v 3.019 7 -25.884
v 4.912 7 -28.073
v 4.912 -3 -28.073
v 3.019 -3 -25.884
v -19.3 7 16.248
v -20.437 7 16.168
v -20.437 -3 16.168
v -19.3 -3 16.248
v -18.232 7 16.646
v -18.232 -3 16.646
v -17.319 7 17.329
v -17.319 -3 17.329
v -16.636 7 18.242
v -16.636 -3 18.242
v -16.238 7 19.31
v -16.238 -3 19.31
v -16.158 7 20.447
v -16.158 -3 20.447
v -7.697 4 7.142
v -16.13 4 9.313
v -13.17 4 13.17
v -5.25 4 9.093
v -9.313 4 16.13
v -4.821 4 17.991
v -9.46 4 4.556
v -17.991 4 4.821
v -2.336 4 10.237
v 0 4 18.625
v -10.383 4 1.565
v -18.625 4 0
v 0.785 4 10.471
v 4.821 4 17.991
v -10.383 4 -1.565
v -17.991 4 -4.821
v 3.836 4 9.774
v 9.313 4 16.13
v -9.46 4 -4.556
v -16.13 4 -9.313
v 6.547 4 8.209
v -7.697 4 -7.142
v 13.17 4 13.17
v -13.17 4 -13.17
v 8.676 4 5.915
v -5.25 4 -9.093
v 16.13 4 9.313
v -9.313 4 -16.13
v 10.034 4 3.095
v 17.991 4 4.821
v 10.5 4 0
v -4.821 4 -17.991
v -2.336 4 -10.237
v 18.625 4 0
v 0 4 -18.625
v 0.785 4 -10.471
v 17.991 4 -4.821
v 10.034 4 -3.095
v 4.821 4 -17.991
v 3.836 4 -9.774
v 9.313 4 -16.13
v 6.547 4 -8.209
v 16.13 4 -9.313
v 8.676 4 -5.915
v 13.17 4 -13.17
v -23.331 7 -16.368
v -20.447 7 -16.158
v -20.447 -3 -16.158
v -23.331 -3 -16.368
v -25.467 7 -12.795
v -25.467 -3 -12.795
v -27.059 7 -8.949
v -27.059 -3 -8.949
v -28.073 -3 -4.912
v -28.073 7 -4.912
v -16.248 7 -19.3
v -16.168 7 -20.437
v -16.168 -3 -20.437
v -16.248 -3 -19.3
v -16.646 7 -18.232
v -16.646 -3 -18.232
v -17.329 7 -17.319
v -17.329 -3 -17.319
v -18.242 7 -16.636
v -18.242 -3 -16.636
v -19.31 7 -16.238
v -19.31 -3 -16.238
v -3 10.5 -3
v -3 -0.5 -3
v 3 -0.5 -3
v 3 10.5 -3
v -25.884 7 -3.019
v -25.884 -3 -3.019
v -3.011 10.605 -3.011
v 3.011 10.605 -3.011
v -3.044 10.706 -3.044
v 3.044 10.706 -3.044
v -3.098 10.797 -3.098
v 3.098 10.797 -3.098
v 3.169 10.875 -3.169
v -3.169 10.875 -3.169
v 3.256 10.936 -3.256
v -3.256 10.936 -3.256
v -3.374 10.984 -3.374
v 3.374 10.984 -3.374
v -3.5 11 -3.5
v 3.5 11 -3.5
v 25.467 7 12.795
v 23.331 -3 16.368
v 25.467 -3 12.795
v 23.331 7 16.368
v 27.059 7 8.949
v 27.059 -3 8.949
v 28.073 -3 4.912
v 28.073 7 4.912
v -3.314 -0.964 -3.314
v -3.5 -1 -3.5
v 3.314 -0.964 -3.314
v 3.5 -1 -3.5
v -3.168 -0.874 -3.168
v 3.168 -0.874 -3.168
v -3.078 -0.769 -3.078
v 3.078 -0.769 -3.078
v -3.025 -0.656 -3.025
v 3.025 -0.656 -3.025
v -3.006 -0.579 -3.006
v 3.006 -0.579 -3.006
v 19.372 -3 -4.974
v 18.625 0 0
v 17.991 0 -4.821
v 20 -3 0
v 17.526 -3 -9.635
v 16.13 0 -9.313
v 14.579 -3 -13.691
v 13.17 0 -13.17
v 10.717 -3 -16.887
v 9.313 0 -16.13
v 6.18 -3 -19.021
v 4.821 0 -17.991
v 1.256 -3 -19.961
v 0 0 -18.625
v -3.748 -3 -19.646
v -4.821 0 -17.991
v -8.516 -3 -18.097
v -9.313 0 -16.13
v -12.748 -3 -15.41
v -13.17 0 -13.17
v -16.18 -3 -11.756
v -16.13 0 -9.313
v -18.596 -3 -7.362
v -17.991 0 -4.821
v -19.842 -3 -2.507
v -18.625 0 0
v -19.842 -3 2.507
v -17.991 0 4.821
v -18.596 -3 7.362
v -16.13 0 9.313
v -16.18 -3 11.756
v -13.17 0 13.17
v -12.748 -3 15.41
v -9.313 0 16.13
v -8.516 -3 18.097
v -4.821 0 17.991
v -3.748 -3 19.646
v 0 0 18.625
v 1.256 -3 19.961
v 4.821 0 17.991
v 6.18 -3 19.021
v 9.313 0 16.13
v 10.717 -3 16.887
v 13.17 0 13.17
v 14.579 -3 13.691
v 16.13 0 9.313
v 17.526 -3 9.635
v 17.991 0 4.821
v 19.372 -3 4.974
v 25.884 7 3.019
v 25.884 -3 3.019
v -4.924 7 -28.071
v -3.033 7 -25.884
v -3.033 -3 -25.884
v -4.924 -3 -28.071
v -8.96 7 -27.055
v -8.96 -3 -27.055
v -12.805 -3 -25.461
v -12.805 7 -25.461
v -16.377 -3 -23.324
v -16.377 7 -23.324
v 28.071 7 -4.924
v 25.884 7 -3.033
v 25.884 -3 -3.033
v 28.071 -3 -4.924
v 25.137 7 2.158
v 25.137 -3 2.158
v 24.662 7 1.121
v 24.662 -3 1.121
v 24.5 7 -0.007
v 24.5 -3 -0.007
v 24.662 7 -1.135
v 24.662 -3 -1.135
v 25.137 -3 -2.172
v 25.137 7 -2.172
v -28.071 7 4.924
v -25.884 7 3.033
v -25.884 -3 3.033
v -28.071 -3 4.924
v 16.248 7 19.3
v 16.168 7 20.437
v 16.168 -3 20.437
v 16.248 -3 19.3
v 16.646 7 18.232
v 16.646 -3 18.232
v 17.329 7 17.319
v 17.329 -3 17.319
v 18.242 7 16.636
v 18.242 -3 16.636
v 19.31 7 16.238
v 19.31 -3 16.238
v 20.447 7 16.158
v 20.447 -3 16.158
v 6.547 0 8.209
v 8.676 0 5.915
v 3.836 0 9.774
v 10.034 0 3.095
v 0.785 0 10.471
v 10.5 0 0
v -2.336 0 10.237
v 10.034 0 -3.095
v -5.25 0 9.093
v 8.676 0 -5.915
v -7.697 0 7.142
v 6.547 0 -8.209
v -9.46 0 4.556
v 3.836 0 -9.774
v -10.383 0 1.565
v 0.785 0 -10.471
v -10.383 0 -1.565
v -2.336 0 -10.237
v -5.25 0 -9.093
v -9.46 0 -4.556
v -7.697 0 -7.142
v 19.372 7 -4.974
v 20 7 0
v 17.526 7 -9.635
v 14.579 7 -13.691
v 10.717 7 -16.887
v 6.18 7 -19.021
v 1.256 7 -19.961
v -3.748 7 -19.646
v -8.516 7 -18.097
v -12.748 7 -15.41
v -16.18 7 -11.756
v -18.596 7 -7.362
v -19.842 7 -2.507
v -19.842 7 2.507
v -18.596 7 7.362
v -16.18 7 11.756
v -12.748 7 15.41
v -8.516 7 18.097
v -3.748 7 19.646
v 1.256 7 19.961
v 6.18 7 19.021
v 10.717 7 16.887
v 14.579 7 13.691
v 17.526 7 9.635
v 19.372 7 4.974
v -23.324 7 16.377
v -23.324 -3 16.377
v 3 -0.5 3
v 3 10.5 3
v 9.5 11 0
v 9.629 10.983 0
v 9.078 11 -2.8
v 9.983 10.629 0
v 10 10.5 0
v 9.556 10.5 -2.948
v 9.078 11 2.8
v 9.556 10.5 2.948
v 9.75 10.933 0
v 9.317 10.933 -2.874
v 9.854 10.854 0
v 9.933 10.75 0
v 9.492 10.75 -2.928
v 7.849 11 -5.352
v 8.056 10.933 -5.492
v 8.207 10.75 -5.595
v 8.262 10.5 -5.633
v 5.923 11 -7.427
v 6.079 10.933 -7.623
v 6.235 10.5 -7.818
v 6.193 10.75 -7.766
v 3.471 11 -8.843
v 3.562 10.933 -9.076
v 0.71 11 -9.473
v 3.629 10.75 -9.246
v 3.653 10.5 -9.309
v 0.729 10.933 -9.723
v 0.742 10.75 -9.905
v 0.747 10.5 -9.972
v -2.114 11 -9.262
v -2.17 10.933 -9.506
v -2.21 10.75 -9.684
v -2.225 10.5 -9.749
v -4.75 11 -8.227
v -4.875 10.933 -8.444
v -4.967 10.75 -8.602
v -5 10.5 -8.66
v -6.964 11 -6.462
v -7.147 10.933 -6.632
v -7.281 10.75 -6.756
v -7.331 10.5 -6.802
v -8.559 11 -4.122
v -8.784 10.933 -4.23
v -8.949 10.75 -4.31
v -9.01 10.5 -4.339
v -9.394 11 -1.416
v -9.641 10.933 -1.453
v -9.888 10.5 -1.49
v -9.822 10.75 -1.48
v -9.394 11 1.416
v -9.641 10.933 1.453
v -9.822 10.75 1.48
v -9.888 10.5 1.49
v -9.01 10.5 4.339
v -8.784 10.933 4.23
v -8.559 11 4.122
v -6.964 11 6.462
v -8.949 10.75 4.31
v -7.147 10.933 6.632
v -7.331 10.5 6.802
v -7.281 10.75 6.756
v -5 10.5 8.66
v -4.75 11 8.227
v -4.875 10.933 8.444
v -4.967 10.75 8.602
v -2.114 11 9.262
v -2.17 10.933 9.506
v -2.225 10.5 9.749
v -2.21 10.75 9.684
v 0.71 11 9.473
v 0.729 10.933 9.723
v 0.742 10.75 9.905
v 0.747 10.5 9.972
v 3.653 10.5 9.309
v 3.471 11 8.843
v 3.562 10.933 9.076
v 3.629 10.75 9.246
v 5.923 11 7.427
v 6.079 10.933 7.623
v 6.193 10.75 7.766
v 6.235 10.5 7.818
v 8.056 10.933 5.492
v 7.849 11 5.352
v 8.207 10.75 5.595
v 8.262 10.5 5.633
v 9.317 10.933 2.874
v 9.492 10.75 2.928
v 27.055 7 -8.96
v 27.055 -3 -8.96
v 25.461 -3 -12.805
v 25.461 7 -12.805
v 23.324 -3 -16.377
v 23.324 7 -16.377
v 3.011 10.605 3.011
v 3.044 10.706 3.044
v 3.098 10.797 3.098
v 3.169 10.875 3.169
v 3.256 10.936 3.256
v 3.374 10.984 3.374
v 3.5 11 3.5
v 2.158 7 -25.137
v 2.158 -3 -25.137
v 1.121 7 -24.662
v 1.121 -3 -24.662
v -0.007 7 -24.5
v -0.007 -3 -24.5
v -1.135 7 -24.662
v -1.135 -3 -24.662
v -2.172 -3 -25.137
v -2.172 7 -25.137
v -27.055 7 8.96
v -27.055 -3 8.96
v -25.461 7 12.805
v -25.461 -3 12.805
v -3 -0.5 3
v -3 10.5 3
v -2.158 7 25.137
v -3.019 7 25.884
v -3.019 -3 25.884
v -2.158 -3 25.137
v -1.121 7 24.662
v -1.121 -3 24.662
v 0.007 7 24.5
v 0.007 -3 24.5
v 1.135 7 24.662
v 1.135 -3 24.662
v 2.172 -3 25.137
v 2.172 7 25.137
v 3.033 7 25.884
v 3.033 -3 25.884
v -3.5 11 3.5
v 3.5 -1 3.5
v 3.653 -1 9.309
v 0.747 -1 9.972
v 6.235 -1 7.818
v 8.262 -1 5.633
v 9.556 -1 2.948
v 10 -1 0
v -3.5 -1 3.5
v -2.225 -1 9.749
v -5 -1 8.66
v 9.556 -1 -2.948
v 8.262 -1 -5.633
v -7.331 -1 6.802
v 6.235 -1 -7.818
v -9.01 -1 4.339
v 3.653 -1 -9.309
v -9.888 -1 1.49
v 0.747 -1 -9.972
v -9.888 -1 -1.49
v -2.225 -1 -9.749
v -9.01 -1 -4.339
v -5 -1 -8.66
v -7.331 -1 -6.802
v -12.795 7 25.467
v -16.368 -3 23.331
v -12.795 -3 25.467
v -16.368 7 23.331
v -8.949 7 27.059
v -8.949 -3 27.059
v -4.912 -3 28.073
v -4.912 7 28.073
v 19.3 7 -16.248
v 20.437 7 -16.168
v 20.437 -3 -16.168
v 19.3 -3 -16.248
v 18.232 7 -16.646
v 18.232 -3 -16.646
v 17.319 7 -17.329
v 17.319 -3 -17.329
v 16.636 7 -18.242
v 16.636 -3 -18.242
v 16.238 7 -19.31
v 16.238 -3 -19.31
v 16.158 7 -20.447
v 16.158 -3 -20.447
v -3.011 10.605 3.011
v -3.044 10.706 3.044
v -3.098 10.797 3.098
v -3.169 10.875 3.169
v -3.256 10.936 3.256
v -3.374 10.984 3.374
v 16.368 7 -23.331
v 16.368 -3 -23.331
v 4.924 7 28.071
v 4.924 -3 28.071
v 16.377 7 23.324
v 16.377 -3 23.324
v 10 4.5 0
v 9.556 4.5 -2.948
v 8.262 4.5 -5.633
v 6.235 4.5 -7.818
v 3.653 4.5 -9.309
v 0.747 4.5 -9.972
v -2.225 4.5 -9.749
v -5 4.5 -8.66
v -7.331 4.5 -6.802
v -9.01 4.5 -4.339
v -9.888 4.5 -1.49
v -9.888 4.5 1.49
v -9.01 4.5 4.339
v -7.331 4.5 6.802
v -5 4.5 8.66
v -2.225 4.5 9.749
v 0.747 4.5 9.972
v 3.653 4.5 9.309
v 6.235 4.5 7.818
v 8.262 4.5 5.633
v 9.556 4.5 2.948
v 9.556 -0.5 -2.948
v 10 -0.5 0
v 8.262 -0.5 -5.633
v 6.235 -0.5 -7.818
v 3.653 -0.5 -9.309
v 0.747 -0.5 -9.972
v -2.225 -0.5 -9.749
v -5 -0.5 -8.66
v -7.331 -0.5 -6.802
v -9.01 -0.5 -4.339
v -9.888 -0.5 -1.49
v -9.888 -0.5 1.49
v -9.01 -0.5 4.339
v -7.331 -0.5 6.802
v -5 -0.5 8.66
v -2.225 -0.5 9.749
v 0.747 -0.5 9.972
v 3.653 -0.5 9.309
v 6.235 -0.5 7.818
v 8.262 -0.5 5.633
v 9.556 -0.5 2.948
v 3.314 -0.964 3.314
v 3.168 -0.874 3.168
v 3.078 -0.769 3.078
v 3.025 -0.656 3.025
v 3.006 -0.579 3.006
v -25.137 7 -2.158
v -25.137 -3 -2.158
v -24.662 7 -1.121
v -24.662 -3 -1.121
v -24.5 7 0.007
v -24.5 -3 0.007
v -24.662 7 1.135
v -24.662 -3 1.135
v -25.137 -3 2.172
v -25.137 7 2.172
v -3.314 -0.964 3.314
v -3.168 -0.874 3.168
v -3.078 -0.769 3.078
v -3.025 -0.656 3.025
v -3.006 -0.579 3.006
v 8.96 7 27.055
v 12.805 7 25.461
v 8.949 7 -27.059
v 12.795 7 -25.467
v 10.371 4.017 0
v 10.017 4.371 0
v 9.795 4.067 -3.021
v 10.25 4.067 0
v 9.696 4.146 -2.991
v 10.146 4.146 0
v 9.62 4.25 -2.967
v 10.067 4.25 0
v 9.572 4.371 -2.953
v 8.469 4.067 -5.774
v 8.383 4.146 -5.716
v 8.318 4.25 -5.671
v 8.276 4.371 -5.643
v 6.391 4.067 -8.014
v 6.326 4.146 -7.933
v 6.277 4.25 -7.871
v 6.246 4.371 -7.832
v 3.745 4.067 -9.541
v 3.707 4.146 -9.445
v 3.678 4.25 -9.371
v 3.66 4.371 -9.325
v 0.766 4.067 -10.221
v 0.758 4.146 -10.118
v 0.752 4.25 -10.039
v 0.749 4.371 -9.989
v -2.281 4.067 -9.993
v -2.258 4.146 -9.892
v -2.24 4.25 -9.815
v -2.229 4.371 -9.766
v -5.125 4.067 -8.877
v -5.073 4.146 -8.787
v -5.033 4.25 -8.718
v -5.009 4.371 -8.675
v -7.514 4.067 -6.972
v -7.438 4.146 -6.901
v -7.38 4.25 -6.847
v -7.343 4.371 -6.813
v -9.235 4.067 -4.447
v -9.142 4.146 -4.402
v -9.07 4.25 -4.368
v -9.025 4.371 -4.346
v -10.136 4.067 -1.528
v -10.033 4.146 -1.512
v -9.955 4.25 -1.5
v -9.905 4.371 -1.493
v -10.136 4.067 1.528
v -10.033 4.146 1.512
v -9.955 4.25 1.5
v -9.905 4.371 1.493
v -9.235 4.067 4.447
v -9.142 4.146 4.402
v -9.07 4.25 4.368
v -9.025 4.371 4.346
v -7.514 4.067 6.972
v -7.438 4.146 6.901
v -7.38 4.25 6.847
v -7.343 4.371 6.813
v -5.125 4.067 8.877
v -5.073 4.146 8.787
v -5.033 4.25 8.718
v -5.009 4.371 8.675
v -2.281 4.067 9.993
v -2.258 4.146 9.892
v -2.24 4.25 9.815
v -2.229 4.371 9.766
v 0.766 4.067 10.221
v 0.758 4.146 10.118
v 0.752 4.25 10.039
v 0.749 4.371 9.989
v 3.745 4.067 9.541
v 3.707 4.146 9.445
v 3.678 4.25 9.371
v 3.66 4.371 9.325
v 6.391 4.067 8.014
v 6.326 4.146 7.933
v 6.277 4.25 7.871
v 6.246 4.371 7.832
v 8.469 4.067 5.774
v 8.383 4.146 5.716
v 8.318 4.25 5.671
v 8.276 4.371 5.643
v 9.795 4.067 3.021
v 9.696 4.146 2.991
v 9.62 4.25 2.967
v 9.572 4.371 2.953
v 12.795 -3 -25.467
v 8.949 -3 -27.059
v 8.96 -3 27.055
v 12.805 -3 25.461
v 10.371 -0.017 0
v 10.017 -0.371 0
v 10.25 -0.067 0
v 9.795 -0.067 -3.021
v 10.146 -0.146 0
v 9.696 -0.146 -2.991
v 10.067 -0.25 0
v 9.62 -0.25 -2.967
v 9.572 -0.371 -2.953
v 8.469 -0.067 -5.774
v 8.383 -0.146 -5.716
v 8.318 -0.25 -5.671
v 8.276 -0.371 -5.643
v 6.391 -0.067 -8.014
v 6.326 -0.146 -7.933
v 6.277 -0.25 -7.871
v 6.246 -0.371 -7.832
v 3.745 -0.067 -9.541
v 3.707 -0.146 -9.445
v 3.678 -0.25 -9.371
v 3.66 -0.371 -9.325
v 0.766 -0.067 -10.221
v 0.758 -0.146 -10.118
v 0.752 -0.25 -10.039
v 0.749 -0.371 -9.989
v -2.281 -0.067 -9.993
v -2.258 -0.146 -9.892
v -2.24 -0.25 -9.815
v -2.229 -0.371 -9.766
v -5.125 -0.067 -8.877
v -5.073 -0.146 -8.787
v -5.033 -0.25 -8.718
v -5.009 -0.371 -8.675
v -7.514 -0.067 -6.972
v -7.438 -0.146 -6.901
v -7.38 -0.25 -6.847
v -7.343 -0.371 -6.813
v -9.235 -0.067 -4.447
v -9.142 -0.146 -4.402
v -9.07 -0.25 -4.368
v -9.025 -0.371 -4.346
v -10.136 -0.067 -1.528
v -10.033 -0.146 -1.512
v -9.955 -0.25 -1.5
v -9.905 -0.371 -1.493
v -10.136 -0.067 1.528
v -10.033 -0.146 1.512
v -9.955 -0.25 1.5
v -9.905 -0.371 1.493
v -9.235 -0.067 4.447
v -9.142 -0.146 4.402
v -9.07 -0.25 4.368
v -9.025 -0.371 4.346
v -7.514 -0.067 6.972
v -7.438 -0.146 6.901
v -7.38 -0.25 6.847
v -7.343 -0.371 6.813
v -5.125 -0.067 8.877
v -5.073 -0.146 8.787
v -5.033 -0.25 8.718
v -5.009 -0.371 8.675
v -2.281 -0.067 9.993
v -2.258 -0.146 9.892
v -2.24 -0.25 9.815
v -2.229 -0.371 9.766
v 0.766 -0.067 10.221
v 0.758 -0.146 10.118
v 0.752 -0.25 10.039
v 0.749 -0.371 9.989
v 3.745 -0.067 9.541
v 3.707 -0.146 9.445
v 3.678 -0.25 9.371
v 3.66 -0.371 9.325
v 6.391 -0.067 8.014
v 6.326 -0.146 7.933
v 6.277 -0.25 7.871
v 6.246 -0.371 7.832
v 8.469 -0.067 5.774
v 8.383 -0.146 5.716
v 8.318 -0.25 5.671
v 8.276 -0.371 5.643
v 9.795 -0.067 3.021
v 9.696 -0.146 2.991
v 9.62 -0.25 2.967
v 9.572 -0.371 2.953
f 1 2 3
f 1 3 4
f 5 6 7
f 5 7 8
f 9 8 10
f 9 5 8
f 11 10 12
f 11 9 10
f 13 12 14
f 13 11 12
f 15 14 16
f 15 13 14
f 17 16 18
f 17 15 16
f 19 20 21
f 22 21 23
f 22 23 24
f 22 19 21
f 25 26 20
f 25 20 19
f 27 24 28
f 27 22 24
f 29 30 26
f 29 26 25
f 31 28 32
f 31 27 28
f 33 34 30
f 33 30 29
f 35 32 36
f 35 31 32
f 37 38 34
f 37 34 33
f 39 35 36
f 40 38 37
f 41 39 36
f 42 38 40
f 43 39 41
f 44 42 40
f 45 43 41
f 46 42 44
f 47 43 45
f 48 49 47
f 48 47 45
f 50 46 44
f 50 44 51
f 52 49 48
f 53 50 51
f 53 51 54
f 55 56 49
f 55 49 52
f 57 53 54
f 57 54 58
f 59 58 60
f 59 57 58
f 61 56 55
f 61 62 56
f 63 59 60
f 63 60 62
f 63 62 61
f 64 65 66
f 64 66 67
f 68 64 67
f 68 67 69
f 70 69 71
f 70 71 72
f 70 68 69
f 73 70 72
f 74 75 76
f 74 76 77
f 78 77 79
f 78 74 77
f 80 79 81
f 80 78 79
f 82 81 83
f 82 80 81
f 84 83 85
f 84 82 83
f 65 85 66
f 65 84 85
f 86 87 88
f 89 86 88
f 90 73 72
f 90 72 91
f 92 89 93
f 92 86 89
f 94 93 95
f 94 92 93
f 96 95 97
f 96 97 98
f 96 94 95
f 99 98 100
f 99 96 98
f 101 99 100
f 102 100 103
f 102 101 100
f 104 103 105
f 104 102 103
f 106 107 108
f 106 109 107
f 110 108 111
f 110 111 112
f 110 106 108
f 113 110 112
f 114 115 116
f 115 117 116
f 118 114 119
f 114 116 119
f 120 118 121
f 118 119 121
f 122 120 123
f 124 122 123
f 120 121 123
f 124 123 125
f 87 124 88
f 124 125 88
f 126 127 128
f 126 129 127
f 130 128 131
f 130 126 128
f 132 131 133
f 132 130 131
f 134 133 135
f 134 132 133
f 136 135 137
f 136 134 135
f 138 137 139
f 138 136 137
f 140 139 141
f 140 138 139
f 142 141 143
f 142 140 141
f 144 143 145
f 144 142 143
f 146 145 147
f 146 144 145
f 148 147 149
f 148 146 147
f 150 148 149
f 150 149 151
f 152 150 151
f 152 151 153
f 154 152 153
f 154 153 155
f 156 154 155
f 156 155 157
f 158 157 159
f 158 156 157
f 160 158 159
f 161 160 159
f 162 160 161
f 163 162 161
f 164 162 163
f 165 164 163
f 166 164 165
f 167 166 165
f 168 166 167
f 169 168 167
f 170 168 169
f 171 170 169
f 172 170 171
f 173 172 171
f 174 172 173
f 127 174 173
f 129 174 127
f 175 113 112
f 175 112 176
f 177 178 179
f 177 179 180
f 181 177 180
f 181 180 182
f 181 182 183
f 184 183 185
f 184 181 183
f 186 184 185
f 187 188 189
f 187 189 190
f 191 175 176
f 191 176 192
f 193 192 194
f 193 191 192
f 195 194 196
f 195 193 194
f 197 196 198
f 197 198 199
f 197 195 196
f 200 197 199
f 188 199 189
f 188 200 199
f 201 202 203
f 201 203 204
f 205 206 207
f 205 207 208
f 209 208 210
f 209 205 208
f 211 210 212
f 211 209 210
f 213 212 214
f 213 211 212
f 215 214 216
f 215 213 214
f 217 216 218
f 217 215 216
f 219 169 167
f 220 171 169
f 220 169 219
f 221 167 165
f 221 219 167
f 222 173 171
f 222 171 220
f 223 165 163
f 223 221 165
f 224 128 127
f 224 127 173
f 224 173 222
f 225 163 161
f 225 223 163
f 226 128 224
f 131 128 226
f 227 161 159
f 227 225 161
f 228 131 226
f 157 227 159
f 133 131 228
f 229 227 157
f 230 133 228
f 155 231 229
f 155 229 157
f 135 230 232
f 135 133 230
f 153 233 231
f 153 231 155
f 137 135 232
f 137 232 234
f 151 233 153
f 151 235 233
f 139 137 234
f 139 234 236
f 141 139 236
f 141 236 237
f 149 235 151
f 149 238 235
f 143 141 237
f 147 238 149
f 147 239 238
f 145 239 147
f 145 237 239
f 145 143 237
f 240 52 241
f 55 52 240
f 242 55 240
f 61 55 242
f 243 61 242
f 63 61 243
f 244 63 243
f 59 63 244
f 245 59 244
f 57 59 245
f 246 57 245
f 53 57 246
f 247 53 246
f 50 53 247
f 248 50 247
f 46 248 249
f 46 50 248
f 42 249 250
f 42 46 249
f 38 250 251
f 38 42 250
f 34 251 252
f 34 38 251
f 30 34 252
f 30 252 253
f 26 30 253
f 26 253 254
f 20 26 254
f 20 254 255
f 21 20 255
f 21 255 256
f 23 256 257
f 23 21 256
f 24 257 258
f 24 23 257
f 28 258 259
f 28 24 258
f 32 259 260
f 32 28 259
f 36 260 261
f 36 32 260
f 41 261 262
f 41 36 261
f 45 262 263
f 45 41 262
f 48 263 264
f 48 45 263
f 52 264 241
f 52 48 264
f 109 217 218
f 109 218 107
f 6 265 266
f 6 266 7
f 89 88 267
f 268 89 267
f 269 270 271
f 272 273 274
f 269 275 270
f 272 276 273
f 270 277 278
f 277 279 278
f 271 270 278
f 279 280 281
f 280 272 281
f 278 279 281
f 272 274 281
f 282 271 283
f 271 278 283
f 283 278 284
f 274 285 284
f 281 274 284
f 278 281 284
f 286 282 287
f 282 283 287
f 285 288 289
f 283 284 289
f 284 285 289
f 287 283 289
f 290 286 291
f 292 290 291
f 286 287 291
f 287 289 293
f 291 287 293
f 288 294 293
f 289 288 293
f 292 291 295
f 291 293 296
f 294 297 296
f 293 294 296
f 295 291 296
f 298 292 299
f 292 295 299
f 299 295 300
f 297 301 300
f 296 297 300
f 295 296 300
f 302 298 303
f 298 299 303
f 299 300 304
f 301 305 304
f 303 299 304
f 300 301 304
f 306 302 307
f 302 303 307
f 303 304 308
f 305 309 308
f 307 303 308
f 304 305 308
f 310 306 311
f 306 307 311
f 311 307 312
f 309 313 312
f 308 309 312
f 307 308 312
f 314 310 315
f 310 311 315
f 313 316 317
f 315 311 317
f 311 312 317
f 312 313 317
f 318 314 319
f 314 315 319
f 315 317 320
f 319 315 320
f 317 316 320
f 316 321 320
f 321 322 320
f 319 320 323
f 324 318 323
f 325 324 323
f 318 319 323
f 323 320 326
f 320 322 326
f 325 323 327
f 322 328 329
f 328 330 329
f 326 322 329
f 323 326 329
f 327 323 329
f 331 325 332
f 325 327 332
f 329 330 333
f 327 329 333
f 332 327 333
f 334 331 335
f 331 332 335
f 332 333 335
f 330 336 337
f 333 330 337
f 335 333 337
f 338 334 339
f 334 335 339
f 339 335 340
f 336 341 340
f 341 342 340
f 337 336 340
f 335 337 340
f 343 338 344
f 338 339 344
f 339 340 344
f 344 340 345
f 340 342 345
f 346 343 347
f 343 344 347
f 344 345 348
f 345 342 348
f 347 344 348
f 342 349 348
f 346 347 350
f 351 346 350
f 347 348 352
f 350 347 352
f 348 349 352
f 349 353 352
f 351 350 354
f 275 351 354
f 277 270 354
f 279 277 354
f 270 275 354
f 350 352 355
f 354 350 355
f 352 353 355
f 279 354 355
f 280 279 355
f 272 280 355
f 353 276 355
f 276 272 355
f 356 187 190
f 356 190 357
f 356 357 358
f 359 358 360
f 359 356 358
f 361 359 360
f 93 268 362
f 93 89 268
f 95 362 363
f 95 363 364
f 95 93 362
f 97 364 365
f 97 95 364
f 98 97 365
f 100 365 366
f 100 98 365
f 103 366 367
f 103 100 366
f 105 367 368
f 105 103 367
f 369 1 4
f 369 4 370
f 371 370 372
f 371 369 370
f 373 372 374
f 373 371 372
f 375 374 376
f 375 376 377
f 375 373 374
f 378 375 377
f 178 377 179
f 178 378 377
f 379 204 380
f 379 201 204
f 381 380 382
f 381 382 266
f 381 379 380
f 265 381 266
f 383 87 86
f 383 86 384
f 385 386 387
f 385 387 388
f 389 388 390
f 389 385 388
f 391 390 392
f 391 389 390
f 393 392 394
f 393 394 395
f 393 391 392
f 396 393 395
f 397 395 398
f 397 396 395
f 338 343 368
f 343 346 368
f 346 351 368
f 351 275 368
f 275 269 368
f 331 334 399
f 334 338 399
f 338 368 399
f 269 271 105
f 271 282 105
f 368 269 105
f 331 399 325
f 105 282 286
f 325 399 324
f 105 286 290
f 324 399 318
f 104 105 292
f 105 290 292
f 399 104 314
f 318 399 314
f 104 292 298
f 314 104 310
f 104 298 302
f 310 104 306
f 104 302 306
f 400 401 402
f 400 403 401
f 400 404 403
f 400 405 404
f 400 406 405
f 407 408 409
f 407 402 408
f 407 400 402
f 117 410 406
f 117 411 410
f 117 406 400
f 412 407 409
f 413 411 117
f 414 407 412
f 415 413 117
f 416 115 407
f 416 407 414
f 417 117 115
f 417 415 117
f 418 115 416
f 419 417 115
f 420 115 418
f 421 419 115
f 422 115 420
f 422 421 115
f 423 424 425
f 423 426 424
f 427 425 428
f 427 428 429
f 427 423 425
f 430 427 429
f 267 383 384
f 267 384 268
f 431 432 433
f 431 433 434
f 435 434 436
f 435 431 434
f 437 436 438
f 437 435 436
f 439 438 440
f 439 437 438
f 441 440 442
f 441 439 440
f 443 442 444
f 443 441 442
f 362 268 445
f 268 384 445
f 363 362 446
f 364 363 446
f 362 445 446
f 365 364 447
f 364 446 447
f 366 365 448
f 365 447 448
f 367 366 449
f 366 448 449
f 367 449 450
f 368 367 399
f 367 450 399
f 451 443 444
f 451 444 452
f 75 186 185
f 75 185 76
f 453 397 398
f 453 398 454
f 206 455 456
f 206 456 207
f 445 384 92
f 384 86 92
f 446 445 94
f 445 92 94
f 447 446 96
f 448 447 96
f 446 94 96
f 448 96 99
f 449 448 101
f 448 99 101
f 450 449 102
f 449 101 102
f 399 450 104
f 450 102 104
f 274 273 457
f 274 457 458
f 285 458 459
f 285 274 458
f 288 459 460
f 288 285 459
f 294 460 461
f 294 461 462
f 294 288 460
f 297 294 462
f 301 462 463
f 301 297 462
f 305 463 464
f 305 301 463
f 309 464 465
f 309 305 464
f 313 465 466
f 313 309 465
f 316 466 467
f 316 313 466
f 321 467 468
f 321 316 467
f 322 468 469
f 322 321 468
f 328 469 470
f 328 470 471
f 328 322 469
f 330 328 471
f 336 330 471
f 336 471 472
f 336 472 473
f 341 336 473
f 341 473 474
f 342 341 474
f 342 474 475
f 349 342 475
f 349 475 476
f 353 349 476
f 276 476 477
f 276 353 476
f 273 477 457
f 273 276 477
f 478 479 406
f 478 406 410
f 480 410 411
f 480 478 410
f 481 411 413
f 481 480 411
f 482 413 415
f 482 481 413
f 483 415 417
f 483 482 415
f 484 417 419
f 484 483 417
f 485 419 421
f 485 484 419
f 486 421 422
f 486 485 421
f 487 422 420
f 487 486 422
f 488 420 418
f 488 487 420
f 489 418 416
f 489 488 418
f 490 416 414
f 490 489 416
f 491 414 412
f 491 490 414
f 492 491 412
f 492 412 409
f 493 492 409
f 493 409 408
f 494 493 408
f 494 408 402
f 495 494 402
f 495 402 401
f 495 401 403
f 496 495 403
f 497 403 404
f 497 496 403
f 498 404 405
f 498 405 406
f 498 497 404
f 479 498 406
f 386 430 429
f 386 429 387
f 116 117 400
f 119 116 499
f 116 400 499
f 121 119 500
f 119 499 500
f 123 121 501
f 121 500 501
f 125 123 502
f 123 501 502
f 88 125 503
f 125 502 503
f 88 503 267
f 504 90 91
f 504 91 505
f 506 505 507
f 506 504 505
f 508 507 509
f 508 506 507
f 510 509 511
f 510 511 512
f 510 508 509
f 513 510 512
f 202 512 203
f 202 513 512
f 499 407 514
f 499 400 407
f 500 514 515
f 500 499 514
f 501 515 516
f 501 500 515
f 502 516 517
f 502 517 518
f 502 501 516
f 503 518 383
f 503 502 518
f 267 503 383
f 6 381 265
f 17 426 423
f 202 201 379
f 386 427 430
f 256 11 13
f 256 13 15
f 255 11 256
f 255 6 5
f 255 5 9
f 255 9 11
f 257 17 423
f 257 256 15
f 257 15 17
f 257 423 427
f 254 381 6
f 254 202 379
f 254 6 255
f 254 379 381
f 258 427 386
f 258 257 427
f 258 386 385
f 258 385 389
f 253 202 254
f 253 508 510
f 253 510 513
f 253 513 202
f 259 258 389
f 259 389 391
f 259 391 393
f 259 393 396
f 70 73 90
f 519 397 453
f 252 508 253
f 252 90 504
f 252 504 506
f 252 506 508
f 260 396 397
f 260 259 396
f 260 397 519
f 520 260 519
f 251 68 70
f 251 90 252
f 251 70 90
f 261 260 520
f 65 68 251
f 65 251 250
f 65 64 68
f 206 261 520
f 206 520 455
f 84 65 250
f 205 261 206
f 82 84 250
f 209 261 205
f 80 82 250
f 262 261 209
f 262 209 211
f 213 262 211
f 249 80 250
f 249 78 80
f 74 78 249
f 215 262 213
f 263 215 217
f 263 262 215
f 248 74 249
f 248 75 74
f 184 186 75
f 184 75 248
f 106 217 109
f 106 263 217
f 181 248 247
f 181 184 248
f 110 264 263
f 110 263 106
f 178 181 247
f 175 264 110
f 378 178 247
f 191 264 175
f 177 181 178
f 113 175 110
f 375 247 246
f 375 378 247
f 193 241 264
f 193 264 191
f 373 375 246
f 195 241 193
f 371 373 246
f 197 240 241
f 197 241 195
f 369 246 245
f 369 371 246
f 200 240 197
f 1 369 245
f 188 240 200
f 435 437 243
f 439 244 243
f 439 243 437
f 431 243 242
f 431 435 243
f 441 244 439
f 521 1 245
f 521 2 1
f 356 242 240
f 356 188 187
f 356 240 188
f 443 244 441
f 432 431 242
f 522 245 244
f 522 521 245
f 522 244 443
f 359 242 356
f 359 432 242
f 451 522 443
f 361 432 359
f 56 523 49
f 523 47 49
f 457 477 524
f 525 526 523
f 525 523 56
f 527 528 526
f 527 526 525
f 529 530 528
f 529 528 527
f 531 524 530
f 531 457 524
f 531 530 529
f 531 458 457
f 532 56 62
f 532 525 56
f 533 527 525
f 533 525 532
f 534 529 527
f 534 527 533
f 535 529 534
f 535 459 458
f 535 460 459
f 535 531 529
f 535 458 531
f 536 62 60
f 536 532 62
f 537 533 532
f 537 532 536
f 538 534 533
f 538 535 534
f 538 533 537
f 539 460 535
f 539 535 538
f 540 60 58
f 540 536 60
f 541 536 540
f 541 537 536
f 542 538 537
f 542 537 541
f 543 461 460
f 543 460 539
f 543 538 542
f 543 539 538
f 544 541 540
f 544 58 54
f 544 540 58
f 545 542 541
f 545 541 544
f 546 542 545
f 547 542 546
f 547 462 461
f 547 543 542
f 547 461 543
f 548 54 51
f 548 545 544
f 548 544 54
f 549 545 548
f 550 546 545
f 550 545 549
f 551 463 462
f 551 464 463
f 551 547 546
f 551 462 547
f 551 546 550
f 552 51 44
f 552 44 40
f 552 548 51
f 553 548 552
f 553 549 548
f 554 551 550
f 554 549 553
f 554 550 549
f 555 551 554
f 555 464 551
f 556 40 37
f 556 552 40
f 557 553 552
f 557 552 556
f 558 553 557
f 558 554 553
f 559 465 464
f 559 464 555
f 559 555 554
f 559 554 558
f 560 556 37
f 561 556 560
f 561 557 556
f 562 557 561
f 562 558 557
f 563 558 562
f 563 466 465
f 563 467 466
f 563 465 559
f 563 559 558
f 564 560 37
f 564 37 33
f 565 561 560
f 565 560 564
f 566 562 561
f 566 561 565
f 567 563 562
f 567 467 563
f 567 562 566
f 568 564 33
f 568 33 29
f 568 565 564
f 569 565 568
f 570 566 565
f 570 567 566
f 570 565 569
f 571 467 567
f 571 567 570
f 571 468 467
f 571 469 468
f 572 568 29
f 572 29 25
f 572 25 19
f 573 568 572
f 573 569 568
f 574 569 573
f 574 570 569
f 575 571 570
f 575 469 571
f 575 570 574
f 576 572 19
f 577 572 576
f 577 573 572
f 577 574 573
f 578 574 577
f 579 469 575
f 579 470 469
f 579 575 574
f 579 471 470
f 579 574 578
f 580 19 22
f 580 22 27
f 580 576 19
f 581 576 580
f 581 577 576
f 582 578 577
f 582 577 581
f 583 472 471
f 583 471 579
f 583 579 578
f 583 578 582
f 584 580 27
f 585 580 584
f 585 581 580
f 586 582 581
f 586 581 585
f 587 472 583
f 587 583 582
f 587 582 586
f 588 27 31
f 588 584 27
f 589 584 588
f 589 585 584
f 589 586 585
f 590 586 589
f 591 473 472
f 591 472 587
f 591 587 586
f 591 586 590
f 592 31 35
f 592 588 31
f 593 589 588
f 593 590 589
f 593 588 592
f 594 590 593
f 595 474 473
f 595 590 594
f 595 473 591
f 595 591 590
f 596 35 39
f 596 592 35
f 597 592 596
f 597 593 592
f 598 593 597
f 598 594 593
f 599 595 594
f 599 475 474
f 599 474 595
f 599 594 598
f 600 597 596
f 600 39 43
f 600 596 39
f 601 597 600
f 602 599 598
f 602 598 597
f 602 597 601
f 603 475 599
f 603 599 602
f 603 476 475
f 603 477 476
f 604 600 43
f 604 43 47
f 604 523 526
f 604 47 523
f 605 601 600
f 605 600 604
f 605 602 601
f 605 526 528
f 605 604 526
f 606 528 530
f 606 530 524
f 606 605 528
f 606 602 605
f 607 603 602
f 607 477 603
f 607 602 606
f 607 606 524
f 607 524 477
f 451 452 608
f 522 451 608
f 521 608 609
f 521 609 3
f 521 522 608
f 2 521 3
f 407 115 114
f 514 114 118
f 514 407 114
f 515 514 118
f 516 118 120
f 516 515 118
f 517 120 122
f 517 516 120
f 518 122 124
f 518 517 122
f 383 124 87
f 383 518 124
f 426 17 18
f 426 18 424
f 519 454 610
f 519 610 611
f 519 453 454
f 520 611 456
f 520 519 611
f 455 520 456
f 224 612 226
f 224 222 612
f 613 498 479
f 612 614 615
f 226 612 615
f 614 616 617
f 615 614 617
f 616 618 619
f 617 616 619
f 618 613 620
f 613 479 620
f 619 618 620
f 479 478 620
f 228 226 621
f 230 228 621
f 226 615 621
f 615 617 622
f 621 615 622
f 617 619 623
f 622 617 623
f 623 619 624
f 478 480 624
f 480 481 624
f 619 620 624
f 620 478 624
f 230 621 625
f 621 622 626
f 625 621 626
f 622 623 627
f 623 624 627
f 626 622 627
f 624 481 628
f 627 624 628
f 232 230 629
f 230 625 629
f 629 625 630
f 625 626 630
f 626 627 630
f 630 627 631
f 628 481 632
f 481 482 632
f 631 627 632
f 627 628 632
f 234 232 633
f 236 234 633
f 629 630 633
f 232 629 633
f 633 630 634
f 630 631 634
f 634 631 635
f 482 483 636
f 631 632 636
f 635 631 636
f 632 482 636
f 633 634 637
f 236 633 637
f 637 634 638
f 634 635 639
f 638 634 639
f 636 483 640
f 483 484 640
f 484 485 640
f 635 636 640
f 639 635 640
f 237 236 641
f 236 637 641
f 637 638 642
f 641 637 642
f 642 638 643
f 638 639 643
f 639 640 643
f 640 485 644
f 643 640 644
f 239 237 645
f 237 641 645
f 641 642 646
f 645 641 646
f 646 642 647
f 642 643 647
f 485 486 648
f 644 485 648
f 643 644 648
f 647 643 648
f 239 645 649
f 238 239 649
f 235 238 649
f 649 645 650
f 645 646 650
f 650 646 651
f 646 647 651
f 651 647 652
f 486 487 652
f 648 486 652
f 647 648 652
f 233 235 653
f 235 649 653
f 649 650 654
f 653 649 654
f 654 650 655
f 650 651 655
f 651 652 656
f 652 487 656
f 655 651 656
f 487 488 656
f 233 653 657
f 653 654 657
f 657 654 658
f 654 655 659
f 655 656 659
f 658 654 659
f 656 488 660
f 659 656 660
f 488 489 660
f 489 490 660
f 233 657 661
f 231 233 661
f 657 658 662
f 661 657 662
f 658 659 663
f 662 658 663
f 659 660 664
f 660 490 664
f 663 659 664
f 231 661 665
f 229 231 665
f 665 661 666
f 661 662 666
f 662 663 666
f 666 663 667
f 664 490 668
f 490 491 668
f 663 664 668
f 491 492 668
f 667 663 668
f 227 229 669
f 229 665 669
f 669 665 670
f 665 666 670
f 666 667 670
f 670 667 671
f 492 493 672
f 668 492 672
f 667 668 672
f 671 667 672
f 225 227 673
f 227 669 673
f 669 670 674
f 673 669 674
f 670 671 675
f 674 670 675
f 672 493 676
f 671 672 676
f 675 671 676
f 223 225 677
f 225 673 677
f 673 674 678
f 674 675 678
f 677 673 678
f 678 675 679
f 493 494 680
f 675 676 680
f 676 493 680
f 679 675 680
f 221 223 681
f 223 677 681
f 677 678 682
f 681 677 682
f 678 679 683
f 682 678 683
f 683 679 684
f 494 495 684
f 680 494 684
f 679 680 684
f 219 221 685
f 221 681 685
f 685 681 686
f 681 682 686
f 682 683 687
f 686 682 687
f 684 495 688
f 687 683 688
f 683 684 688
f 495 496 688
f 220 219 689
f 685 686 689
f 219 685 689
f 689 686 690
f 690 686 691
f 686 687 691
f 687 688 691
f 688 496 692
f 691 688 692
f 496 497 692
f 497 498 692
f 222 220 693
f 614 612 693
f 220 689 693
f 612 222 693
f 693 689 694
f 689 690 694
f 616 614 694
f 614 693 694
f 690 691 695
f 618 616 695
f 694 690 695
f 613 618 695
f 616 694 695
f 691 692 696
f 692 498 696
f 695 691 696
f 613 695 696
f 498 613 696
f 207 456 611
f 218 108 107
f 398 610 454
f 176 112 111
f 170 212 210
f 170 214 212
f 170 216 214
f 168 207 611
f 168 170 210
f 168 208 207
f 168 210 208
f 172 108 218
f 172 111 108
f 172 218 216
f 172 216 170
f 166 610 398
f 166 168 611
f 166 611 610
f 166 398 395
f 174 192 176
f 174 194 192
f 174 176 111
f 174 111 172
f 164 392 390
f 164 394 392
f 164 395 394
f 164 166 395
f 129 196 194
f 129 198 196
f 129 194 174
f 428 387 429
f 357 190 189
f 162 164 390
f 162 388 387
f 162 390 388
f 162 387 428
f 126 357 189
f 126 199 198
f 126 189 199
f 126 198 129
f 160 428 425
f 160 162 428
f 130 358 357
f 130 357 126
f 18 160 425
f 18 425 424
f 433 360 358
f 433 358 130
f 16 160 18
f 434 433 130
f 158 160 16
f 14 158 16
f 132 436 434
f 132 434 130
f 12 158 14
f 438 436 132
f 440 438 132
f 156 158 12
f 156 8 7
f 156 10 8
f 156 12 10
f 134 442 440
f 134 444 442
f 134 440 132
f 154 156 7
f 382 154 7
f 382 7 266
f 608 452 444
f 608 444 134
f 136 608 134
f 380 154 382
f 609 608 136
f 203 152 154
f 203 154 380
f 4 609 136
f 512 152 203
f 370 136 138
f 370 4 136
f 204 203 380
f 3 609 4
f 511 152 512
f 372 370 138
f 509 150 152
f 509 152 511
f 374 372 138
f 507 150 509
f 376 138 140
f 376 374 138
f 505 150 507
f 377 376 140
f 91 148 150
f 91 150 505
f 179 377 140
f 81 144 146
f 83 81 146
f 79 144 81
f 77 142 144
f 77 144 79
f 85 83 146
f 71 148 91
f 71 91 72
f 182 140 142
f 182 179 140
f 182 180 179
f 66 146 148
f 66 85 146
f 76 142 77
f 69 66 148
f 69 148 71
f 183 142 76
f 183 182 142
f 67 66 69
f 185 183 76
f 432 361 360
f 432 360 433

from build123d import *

# Parameters (mm, degrees)
SKETCH_1_W          = 10
SKETCH_1_H          = 7
SKETCH_1_H_2        = 1
FILLET_3_R          = 0.5
FILLET_4_R          = 0.5
CUT_EXTRUDE_1_DEPTH = 10
CUT_EXTRUDE_2_REACH = 14
SKETCH_5_W          = 6
SKETCH_5_H          = 6
FILLET_5_R          = 0.5
FILLET_6_R          = 0.5


with BuildPart() as part:
    # Эскиз1 → Повернуть1 (revolve)
    with BuildSketch(Plane.XY):
        Polygon((20, 4), (20, 2), (20, 0), (20, -3), (28.5, -3), (28.5, 7), (20, 7), align=None)
        Polygon((20, 0), (20, 2), (20, 4), (18.625227292, 4), (10, 4), (0, 4), (0, 0), (10, 0), (18.625227292, 0), align=None)
        with Locations((5, 7.5)):
            Rectangle(SKETCH_1_W, SKETCH_1_H)
        with Locations((5, -0.5)):
            Rectangle(SKETCH_1_W, SKETCH_1_H_2)
        Polygon((18.625227292, 4), (20, 4), (20, 7), align=None)
        Polygon((20, -3), (20, 0), (18.625227292, 0), align=None)
    revolve(axis=Axis((0, 0, 0), (0, 1, 0)))

    # Скругление3
    fillet_3_edges = [part.edges().sort_by_distance(p)[0] for p in [
        (-10, 4, 0),
    ]]
    fillet(fillet_3_edges, radius=FILLET_3_R)

    # Скругление4
    fillet_4_edges = [part.edges().sort_by_distance(p)[0] for p in [
        (-10, 0, 0),
    ]]
    fillet(fillet_4_edges, radius=FILLET_4_R)

    # Эскиз4 → Вырез-Вытянуть1 (cut)
    with BuildSketch(Plane(origin=(0, 7, 0), x_dir=(1, 0, 0), z_dir=(0, 1, 0))):
        with BuildLine():
            Line((-3.032652989, 25.883771919), (-8.753058696, 32.499672333))
            Line((-8.753058696, 32.499672333), (8.739316139, 32.499672333))
            Line((8.739316139, 32.499672333), (3.018910432, 25.883771919))
            ThreePointArc((3.018910432, 25.883771919), (-0.006871279, 24.499999172), (-3.032652989, 25.883771919))
        make_face()
        with BuildLine():
            Line((16.791391533, 29.170085853), (29.160368398, 16.801108988))
            Line((29.160368398, 16.801108988), (20.437282685, 16.167898608))
            ThreePointArc((20.437282685, 16.167898608), (17.319256826, 17.328974281), (16.158181153, 20.44700014))
            Line((16.158181153, 20.44700014), (16.791391533, 29.170085853))
        make_face()
        with BuildLine():
            Line((32.499672333, 8.753058696), (32.499672333, -8.739316139))
            Line((32.499672333, -8.739316139), (25.883771919, -3.018910432))
            ThreePointArc((25.883771919, -3.018910432), (24.499999172, 0.006871279), (25.883771919, 3.032652989))
            Line((25.883771919, 3.032652989), (32.499672333, 8.753058696))
        make_face()
        with BuildLine():
            Line((29.170085853, -16.791391533), (16.801108988, -29.160368398))
            Line((16.801108988, -29.160368398), (16.167898608, -20.437282685))
            ThreePointArc((16.167898608, -20.437282685), (17.328974281, -17.319256826), (20.44700014, -16.158181153))
            Line((20.44700014, -16.158181153), (29.170085853, -16.791391533))
        make_face()
        with BuildLine():
            Line((8.753058696, -32.499672333), (-8.739316139, -32.499672333))
            Line((-8.739316139, -32.499672333), (-3.018910432, -25.883771919))
            ThreePointArc((-3.018910432, -25.883771919), (0.006871279, -24.499999172), (3.032652989, -25.883771919))
            Line((3.032652989, -25.883771919), (8.753058696, -32.499672333))
        make_face()
        with BuildLine():
            Line((-16.791391533, -29.170085853), (-29.160368398, -16.801108988))
            Line((-29.160368398, -16.801108988), (-20.437282685, -16.167898608))
            ThreePointArc((-20.437282685, -16.167898608), (-17.319256826, -17.328974281), (-16.158181153, -20.44700014))
            Line((-16.158181153, -20.44700014), (-16.791391533, -29.170085853))
        make_face()
        with BuildLine():
            Line((-32.499672333, -8.753058696), (-32.499672333, 8.739316139))
            Line((-32.499672333, 8.739316139), (-25.883771919, 3.018910432))
            ThreePointArc((-25.883771919, 3.018910432), (-24.499999172, -0.006871279), (-25.883771919, -3.032652989))
            Line((-25.883771919, -3.032652989), (-32.499672333, -8.753058696))
        make_face()
        with BuildLine():
            Line((-29.170085853, 16.791391533), (-16.801108988, 29.160368398))
            Line((-16.801108988, 29.160368398), (-16.167898608, 20.437282685))
            ThreePointArc((-16.167898608, 20.437282685), (-17.328974281, 17.319256826), (-20.44700014, 16.158181153))
            Line((-20.44700014, 16.158181153), (-29.170085853, 16.791391533))
        make_face()
    extrude(amount=-CUT_EXTRUDE_1_DEPTH, mode=Mode.SUBTRACT)

    # Эскиз5 → Вырез-Вытянуть2 (cut, up to next)
    with BuildSketch(Plane.XZ.offset(1), mode=Mode.PRIVATE) as cut_extrude_2_sk1:
        Rectangle(SKETCH_5_W, SKETCH_5_H)
    cut_extrude_2_tool1 = extrude(cut_extrude_2_sk1.sketch, amount=-CUT_EXTRUDE_2_REACH, mode=Mode.PRIVATE) & part.part
    add(cut_extrude_2_tool1.solids().sort_by_distance((0, -1, 0))[0], mode=Mode.SUBTRACT)

    # Скругление5
    fillet_5_edges = [part.edges().sort_by_distance(p)[0] for p in [
        (3, -1, 0),
        (0, -1, 3),
        (-3, -1, 0),
        (0, -1, -3),
        (0, 11, 3),
        (3, 11, 0),
        (0, 11, -3),
        (-3, 11, 0),
    ]]
    fillet(fillet_5_edges, radius=FILLET_5_R)

    # Скругление6
    fillet_6_edges = [part.edges().sort_by_distance(p)[0] for p in [
        (-10, 11, 0),
    ]]
    fillet(fillet_6_edges, radius=FILLET_6_R)


solid = part.part
